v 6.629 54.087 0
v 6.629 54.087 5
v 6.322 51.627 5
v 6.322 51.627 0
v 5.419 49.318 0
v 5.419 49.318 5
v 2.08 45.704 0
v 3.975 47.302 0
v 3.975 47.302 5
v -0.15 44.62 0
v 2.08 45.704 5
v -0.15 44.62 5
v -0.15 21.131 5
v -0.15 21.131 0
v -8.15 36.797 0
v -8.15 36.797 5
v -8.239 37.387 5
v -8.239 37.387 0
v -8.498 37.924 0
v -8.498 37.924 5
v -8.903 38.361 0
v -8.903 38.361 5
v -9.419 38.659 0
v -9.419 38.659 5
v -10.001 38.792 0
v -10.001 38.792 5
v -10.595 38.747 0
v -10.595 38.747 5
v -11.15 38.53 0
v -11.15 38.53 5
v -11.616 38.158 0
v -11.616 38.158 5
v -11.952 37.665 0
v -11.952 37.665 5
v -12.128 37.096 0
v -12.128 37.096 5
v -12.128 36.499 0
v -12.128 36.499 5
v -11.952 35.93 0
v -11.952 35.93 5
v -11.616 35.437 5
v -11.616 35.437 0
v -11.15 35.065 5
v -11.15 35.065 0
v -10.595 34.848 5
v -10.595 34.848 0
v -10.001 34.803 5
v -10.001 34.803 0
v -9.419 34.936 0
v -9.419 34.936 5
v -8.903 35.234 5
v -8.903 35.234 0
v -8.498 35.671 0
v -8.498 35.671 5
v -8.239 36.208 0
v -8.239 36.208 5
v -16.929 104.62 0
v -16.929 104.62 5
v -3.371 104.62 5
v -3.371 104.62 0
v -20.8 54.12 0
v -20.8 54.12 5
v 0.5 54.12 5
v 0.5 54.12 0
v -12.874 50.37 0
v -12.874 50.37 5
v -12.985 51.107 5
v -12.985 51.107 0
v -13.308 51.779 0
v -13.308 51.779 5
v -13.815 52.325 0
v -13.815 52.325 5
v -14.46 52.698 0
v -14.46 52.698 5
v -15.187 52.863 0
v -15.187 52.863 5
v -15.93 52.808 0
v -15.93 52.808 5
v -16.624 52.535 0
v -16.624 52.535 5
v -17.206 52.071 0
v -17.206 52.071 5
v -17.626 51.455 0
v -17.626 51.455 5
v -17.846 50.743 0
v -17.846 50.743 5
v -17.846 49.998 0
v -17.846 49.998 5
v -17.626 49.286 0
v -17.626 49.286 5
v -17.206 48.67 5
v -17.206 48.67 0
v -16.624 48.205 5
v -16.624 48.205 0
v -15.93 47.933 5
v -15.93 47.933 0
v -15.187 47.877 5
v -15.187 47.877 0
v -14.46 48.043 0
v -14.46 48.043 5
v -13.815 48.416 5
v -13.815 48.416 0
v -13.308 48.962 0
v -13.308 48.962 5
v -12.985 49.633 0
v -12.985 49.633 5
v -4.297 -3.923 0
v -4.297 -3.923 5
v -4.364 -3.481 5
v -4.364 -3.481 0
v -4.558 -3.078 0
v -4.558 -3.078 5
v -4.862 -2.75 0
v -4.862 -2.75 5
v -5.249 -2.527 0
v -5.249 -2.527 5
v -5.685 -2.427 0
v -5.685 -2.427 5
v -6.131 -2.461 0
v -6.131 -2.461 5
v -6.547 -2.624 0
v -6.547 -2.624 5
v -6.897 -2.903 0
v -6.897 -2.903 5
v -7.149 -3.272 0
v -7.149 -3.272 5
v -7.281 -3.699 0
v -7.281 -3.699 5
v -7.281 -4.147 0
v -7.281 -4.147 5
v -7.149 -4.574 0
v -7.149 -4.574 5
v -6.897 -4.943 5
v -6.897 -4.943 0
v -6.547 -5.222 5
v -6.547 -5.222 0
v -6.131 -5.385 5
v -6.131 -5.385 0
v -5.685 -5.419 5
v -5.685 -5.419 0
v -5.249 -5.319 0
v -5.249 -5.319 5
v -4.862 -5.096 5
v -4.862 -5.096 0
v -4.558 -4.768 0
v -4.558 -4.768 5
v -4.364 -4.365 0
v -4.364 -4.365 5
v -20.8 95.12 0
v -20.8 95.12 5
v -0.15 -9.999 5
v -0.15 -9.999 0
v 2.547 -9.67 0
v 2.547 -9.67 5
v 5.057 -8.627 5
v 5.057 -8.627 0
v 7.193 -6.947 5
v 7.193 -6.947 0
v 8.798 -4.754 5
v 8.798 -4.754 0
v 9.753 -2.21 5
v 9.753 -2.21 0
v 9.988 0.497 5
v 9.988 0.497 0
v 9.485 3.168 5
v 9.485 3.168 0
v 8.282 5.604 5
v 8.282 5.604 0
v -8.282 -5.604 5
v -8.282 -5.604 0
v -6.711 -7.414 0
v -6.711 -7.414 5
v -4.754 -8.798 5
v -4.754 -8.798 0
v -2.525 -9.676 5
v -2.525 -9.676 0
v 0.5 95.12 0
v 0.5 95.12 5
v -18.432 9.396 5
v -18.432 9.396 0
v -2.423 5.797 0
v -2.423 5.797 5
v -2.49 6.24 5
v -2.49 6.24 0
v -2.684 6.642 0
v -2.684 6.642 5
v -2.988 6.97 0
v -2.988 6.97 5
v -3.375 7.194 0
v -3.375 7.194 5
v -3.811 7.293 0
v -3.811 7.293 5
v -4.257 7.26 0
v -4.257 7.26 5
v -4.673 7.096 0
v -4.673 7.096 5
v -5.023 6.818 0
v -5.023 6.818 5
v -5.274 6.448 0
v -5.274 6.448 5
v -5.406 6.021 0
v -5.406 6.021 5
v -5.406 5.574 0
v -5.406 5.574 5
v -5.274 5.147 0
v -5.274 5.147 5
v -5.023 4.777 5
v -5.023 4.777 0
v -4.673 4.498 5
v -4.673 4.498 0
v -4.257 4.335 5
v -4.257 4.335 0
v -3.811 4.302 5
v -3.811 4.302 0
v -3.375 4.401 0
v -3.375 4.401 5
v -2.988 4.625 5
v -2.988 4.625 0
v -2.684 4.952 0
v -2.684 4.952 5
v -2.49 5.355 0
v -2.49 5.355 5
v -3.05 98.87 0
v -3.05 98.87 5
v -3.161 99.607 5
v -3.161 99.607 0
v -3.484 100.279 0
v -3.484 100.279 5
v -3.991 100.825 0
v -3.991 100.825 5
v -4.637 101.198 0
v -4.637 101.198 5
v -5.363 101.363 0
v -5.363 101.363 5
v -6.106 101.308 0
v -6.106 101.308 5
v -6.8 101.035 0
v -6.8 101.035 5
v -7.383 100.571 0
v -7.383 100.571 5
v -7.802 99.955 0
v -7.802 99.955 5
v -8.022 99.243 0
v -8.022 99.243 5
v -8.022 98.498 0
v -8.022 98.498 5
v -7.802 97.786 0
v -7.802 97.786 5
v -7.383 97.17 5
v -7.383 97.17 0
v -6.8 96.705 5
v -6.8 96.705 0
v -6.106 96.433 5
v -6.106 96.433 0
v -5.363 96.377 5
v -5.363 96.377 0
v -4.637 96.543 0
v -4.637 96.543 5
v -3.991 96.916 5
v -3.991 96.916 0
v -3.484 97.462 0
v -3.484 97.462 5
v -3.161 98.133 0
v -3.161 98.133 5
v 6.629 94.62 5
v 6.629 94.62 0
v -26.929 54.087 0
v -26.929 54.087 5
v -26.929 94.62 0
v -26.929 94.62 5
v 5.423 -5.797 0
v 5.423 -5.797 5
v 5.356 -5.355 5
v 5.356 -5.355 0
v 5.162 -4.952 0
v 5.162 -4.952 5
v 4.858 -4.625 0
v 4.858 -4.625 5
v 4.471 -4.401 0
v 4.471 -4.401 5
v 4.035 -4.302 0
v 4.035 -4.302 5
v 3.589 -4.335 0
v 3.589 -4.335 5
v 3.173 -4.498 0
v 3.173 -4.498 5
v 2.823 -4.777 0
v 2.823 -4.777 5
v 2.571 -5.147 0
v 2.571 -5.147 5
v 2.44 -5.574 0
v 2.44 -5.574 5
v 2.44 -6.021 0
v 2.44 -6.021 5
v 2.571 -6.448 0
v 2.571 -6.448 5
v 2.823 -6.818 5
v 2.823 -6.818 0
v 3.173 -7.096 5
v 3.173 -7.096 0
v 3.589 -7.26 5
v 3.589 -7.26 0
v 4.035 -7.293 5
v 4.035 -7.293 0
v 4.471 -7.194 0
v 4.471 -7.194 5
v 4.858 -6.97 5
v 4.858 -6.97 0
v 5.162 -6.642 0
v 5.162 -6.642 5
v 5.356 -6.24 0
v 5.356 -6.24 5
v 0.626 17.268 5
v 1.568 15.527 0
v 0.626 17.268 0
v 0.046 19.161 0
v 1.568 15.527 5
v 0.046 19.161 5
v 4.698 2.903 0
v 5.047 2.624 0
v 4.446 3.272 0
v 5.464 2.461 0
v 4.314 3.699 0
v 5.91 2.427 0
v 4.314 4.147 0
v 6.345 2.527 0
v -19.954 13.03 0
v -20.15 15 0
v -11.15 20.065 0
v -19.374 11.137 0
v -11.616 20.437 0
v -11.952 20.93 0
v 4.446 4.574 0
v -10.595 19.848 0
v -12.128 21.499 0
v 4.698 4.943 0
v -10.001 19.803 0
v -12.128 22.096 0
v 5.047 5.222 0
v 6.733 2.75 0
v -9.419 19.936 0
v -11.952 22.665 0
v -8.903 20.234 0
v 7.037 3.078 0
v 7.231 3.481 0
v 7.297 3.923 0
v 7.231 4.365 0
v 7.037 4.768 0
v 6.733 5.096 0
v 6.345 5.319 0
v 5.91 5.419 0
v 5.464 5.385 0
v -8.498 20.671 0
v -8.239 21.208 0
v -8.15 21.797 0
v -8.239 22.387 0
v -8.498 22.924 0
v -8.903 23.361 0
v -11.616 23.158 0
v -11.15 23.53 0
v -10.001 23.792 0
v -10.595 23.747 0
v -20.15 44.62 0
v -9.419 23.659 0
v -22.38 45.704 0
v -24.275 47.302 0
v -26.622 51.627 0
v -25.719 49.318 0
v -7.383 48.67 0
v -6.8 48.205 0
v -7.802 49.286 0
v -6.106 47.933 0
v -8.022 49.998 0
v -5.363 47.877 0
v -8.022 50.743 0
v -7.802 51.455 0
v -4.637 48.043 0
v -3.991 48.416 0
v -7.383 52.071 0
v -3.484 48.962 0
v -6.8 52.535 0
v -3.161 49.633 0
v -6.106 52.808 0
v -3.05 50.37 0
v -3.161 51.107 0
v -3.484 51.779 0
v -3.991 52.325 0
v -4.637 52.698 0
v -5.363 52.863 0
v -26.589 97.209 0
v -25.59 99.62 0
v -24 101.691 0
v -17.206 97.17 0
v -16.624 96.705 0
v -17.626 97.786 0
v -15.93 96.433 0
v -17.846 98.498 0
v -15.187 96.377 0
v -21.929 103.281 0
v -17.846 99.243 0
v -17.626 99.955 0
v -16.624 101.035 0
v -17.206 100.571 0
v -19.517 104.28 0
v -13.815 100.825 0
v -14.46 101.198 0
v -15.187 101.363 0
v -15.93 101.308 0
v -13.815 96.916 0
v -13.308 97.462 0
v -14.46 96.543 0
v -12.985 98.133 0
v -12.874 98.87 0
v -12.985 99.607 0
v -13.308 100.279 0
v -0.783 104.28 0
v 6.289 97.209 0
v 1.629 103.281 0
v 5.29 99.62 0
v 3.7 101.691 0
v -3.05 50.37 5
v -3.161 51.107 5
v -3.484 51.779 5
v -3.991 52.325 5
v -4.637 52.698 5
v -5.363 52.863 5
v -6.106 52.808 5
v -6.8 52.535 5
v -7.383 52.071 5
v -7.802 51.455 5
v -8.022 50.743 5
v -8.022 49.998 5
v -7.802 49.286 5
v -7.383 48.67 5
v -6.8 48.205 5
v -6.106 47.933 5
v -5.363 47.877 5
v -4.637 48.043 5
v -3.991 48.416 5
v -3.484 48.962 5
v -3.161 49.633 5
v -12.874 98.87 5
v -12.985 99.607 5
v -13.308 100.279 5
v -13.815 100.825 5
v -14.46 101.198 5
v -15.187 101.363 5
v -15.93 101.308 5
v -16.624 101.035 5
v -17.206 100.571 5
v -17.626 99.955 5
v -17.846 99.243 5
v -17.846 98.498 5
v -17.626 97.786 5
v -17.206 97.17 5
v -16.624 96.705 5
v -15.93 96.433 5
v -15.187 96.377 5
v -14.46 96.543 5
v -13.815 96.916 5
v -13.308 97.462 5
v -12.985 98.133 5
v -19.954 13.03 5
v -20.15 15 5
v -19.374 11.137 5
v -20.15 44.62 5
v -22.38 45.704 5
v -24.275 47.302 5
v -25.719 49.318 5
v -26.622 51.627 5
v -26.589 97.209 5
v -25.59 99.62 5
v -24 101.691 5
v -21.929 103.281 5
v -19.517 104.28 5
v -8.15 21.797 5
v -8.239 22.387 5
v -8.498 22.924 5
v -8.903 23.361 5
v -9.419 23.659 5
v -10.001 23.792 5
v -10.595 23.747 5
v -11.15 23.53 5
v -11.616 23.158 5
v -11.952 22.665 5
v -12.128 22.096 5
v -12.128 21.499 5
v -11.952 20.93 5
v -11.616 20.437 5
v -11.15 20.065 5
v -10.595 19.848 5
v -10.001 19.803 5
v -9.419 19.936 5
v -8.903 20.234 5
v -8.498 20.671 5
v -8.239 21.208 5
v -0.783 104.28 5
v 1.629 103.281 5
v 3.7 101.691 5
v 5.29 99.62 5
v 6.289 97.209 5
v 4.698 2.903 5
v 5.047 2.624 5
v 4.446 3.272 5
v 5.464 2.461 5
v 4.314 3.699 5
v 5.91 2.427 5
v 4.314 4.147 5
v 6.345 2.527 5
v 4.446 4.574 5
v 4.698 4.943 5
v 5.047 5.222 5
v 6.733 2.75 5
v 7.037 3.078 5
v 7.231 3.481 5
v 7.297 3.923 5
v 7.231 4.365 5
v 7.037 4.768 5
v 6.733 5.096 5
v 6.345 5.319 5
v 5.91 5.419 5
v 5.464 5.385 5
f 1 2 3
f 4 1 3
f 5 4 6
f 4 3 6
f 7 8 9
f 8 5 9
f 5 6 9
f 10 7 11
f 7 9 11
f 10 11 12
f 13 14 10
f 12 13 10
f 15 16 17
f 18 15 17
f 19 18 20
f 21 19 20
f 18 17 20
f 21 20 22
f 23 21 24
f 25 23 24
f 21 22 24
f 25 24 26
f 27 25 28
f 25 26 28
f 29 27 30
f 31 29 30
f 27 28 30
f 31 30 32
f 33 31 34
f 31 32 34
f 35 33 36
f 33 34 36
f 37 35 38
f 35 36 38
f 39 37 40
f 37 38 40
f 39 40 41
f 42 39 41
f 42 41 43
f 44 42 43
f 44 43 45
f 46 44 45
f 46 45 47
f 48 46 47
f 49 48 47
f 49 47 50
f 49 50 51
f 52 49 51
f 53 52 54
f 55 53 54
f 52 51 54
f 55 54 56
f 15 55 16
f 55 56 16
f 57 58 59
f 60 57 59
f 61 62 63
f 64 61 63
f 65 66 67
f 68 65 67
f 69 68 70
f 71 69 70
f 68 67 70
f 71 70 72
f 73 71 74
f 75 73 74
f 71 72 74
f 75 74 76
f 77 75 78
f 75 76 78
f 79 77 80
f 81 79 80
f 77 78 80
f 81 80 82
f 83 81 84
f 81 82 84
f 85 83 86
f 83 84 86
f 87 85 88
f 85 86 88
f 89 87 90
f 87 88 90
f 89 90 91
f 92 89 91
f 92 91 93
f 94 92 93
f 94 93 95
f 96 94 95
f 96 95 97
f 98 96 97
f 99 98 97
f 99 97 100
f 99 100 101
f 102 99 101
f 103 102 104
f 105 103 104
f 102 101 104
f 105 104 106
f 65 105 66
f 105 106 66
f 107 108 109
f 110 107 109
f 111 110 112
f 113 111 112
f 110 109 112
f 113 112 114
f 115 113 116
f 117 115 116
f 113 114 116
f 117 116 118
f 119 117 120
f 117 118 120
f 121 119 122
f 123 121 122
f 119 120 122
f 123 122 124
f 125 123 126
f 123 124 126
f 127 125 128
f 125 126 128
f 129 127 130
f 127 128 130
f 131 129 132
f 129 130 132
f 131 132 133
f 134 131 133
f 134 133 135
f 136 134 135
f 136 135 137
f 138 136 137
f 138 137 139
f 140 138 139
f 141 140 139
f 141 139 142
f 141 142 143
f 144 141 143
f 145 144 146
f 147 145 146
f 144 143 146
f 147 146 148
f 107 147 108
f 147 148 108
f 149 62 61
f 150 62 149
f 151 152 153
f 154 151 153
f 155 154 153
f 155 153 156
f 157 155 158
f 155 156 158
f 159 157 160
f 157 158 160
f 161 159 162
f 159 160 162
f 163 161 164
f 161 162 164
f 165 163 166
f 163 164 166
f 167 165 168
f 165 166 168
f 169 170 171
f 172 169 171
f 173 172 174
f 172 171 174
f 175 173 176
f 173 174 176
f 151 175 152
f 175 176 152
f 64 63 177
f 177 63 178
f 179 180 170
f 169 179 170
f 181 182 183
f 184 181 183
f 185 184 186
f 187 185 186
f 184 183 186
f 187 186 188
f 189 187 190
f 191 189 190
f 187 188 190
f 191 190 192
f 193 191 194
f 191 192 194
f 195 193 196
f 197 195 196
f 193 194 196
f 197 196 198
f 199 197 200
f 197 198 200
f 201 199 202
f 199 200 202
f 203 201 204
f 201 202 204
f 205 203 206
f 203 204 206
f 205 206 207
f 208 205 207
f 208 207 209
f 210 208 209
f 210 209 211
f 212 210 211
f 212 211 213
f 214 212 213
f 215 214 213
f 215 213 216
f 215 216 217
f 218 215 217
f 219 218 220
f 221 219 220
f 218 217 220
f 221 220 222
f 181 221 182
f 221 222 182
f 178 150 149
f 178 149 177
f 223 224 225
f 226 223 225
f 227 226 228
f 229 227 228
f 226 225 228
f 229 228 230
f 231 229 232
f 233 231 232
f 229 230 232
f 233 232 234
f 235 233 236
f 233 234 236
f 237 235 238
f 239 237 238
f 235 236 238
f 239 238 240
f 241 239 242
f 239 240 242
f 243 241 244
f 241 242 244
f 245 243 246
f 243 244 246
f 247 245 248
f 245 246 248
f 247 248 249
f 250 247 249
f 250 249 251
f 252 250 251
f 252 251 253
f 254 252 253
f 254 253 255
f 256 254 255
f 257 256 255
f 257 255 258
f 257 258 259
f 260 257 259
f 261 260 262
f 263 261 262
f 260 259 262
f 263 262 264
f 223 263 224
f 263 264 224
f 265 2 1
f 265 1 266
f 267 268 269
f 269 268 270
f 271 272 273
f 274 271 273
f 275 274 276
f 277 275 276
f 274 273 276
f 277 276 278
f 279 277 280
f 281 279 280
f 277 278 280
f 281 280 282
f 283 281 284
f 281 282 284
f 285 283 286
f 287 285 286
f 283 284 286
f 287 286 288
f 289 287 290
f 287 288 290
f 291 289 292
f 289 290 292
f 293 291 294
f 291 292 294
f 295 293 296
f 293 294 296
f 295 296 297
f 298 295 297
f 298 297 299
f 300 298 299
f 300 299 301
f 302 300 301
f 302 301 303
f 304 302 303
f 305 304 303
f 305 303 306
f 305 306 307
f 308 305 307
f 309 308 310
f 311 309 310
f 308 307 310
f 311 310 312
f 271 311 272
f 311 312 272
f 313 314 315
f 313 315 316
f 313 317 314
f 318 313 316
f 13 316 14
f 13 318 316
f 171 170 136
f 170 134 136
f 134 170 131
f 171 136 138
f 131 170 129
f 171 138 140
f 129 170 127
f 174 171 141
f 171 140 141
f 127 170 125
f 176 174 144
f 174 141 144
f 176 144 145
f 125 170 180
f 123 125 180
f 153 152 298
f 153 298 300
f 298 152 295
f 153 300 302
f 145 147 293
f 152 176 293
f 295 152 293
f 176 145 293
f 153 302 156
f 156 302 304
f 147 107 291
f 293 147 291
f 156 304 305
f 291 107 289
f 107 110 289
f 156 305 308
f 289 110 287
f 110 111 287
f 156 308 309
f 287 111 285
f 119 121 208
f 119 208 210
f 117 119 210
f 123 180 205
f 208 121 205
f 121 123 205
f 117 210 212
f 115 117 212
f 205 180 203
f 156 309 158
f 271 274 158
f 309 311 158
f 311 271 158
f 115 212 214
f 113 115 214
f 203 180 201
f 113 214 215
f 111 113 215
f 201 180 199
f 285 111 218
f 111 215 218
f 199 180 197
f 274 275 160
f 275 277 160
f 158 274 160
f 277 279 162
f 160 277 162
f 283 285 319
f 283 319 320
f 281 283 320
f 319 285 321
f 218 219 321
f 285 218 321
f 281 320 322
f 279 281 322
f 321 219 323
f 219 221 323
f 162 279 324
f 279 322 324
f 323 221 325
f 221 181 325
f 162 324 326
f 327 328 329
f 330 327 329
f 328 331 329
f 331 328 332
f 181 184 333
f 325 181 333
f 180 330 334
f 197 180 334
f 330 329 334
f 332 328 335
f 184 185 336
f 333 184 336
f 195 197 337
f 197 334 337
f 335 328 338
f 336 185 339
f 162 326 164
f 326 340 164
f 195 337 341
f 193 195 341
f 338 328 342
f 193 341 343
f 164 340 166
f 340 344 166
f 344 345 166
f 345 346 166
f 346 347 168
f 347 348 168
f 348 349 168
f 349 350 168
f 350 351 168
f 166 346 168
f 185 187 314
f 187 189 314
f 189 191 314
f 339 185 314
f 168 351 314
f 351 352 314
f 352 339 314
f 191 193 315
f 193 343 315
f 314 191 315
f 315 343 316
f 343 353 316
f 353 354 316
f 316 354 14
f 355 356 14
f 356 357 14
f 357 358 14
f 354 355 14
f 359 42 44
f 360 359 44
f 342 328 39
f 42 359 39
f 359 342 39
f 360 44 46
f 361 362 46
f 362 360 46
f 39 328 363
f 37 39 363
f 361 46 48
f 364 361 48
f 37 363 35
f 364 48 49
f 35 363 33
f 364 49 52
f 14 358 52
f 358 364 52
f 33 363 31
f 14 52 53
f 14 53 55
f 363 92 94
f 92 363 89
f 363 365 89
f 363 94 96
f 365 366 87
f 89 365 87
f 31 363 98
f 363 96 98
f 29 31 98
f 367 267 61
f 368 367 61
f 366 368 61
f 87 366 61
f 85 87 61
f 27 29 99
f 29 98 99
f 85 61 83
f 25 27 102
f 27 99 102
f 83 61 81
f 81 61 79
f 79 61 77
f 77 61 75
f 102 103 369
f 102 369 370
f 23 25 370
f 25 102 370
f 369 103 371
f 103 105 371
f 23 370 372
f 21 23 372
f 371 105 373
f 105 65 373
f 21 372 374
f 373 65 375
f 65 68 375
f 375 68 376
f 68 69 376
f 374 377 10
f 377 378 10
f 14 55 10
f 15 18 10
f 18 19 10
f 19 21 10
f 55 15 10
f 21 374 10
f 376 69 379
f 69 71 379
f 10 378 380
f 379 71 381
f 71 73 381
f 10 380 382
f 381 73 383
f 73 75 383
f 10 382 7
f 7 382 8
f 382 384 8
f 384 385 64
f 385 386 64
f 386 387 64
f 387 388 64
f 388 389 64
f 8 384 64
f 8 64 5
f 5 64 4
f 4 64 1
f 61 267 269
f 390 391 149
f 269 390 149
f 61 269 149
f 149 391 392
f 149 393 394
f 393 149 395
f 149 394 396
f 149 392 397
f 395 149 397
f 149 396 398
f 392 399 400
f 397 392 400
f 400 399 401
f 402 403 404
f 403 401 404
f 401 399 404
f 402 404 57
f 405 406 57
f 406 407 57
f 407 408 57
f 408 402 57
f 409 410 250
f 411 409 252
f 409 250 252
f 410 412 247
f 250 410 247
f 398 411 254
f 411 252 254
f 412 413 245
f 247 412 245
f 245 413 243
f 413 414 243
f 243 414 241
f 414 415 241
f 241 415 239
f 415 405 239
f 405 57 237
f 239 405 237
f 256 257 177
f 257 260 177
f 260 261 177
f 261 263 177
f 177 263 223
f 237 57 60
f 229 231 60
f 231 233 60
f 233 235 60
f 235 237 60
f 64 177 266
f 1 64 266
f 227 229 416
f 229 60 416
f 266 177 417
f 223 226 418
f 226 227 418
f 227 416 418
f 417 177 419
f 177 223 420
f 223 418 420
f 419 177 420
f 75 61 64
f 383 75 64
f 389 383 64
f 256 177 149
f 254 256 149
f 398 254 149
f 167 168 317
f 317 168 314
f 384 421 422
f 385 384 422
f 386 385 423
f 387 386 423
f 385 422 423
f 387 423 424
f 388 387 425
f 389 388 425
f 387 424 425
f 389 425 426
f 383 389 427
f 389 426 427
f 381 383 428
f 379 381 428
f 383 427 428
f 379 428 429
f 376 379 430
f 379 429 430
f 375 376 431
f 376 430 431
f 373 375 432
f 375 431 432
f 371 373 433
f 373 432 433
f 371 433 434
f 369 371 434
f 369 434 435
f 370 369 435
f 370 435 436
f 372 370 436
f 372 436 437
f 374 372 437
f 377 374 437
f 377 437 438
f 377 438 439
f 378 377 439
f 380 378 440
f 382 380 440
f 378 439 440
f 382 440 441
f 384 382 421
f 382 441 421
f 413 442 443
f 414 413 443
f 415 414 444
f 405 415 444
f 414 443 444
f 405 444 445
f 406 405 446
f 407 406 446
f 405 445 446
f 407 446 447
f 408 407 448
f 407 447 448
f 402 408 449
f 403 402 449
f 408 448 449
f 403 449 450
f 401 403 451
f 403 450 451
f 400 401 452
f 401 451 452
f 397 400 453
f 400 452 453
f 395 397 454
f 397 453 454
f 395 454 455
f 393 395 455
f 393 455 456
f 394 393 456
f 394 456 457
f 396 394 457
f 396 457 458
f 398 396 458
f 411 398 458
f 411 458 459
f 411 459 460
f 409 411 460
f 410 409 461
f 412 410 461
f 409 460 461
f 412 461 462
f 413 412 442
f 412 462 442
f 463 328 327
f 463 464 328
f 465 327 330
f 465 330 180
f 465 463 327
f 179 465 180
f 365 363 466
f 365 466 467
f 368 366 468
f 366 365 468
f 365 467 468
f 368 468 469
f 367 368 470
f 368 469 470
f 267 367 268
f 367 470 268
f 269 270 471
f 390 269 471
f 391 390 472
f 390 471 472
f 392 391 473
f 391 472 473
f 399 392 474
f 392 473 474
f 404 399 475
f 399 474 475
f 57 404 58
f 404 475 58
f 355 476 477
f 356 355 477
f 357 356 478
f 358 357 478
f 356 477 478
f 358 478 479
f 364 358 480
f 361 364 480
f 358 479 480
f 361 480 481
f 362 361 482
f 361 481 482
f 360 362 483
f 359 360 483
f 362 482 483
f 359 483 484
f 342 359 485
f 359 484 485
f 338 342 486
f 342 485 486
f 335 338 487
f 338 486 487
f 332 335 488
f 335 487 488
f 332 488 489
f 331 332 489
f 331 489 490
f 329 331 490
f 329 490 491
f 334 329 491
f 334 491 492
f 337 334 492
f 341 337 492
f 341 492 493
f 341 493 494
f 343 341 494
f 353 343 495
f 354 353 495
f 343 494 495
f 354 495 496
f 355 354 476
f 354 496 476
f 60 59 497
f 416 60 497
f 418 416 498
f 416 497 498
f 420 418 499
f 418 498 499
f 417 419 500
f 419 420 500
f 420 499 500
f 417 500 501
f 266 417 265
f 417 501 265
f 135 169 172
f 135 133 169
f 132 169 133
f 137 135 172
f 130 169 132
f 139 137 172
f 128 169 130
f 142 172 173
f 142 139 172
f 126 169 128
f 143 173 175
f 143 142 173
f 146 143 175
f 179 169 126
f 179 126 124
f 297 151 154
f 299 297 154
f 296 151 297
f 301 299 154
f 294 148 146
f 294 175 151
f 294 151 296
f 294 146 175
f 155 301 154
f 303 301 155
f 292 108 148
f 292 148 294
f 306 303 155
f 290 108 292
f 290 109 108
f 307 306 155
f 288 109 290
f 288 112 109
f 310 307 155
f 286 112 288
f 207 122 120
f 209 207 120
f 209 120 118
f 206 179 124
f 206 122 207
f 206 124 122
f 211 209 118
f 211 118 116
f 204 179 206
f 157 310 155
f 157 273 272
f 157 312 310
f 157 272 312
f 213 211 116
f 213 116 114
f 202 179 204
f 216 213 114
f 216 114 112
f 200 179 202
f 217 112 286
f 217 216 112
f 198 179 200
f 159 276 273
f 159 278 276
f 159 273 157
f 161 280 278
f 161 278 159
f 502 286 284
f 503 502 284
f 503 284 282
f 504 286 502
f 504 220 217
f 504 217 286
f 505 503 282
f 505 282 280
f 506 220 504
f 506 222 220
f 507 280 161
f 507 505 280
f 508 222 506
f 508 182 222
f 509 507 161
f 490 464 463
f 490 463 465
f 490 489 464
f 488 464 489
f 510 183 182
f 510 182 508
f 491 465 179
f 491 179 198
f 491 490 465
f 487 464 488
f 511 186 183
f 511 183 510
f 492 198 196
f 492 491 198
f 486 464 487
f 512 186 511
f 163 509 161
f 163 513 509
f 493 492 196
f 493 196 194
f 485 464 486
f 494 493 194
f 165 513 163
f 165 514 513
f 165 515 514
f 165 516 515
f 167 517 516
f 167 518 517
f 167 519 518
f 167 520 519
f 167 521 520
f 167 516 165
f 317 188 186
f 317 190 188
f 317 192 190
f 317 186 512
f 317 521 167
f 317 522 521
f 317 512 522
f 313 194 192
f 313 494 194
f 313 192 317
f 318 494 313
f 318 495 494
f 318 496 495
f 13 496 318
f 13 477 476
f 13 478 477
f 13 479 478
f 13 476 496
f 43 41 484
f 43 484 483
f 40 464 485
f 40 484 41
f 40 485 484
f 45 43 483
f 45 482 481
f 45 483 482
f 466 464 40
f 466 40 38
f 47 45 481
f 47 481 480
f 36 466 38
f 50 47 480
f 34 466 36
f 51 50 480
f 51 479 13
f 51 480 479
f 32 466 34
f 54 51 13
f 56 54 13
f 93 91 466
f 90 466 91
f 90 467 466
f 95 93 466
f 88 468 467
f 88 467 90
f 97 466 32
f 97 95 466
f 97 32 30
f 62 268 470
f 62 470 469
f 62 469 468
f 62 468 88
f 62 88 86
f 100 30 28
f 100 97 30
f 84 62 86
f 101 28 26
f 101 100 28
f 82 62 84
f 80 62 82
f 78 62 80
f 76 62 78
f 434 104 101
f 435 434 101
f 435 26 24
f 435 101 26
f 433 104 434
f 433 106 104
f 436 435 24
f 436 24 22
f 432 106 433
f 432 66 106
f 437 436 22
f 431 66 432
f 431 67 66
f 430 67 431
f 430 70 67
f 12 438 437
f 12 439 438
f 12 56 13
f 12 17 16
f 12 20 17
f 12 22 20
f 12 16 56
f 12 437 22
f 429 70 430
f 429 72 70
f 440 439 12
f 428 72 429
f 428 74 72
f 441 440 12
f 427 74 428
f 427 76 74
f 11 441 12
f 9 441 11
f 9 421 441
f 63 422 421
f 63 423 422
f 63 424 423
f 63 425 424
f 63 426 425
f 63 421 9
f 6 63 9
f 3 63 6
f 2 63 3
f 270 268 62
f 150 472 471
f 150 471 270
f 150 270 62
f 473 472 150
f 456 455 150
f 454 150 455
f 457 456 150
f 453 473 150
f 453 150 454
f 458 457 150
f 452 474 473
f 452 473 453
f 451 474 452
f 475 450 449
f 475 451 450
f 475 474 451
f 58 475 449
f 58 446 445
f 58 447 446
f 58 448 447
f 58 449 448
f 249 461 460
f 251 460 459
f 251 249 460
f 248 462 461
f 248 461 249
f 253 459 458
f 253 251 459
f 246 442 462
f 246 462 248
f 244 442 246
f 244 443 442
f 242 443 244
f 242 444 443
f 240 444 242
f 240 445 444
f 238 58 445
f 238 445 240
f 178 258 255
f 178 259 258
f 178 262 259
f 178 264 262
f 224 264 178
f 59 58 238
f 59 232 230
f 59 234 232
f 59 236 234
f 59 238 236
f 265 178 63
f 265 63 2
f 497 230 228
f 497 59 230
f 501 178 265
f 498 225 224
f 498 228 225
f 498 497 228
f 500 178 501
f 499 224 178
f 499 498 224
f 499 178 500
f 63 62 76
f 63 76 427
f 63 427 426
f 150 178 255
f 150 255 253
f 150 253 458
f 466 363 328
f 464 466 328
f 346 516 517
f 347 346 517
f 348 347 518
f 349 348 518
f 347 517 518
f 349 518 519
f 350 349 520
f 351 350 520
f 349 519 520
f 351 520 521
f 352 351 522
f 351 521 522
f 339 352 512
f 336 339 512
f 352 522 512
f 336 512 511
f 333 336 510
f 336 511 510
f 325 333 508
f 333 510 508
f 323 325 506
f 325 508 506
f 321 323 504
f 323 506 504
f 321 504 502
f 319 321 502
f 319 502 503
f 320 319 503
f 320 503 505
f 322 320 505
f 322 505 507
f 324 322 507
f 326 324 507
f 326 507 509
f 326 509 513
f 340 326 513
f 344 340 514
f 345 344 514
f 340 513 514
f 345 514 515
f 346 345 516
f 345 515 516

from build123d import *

# Parameters (mm, degrees)
BOSS_EXTRUDE1_DEPTH = 5
SKETCH4_W           = 33.55861501
SKETCH4_H           = 60
BOSS_EXTRUDE2_DEPTH = 5
SKETCH3_R           = 2.5
SKETCH3_W           = 21.3
SKETCH3_H           = 41
CUT_EXTRUDE1_DEPTH  = 5
FILLET1_R           = 10
SKETCH2_R           = 1.5
SKETCH2_R_2         = 2
CUT_EXTRUDE2_DEPTH  = 5
FILLET2_R           = 10


with BuildPart() as part:
    # Sketch1 → Boss-Extrude1 (new body)
    with BuildSketch(Plane.XY):
        with BuildLine():
            Line((-20.15, 104.620325978), (-20.15, 11.934589711))
            Line((-20.15, 11.934589711), (-8.282080395, -5.604207734))
            ThreePointArc((-8.282080395, -5.604207734), (-4.754289632, -8.797541139), (-0.15, -9.998874937))
            ThreePointArc((-0.15, -9.998874937), (8.797541139, -4.754289632), (8.282080395, 5.604207734))
            Line((8.282080395, 5.604207734), (-0.15, 18.065410289))
            Line((-0.15, 18.065410289), (-0.15, 104.620325978))
            Line((-0.15, 104.620325978), (-20.15, 104.620325978))
        make_face()
    extrude(amount=BOSS_EXTRUDE1_DEPTH)

    # Sketch4 → Boss-Extrude2 (add)
    with BuildSketch(Plane.XY.offset(5)):
        with Locations((-10.15, 74.620325978)):
            Rectangle(SKETCH4_W, SKETCH4_H)
    extrude(amount=-BOSS_EXTRUDE2_DEPTH)

    # Sketch3 → Cut-Extrude1 (cut)
    with BuildSketch(Plane.XY.offset(5)):
        with Locations((-5.55, 50.370325978)):
            Circle(SKETCH3_R)
        with Locations((-15.37372371, 50.370325978)):
            Circle(SKETCH3_R)
        with Locations((-15.37372371, 98.870325978)):
            Circle(SKETCH3_R)
        with Locations((-5.55, 98.870325978)):
            Circle(SKETCH3_R)
        with Locations((-10.15, 74.620325978)):
            Rectangle(SKETCH3_W, SKETCH3_H)
    extrude(amount=-CUT_EXTRUDE1_DEPTH, mode=Mode.SUBTRACT)

    # Fillet1
    # the kernel refuses this fillet: 10 mm, written as the material it takes off along each edge
    with BuildSketch(Plane(origin=(-26.929307505, 104.620325978, 30), x_dir=(1, 0, 0), z_dir=(0, 0, -1))) as fillet1_piece_1:
        with BuildLine():
            CenterArc((FILLET1_R, FILLET1_R), FILLET1_R, 180, 90)
            Line((0, FILLET1_R), (-FILLET1_R * 0.02, FILLET1_R))
            Line((-FILLET1_R * 0.02, FILLET1_R), (-FILLET1_R * 0.02, -FILLET1_R * 0.02))
            Line((-FILLET1_R * 0.02, -FILLET1_R * 0.02), (FILLET1_R, -FILLET1_R * 0.02))
            Line((FILLET1_R, -FILLET1_R * 0.02), (FILLET1_R, 0))
        make_face()
    extrude(amount=55, mode=Mode.SUBTRACT)
    with BuildSketch(Plane(origin=(6.629307505, 104.620325978, 30), x_dir=(-1, 0, 0), z_dir=(0, 0, -1))) as fillet1_piece_2:
        with BuildLine():
            CenterArc((FILLET1_R, -FILLET1_R), FILLET1_R, 90, 90)
            Line((0, -FILLET1_R), (-FILLET1_R * 0.02, -FILLET1_R))
            Line((-FILLET1_R * 0.02, -FILLET1_R), (-FILLET1_R * 0.02, FILLET1_R * 0.02))
            Line((-FILLET1_R * 0.02, FILLET1_R * 0.02), (FILLET1_R, FILLET1_R * 0.02))
            Line((FILLET1_R, FILLET1_R * 0.02), (FILLET1_R, 0))
        make_face()
    extrude(amount=55, mode=Mode.SUBTRACT)
    with BuildSketch(Plane(origin=(6.629307505, 44.620325978, 28.667902824), x_dir=(0, 1, 0), z_dir=(0, 0, -1))) as fillet1_piece_3:
        with BuildLine():
            CenterArc((9.46716113, -10), FILLET1_R, 90, 71.211889426)
            Line((0, -6.779307505), (-0.189343223, -6.714893655))
            ThreePointArc((-0.189343223, -6.714893655), (-0.2, -3.389653753), (-0.2, 0))
            Line((-0.2, 0), (0, 0.2))
            Line((0, 0.2), (9.46716113, 0.2))
            Line((9.46716113, 0.2), (9.46716113, 0))
        make_face()
    extrude(amount=52.335805648, mode=Mode.SUBTRACT)
    with BuildSketch(Plane(origin=(-26.929307505, 44.620325978, 28.667902824), x_dir=(0, 1, 0), z_dir=(0, 0, -1))) as fillet1_piece_4:
        with BuildLine():
            CenterArc((9.46716113, 10), FILLET1_R, 198.788110574, 71.211889426)
            Line((0, 6.779307505), (-0.189343223, 6.714893655))
            ThreePointArc((-0.189343223, 6.714893655), (-0.2, 3.389653753), (-0.2, 0))
            Line((-0.2, 0), (0, -0.2))
            Line((0, -0.2), (9.46716113, -0.2))
            Line((9.46716113, -0.2), (9.46716113, 0))
        make_face()
    extrude(amount=52.335805648, mode=Mode.SUBTRACT)

    # Sketch2 → Cut-Extrude2 (cut)
    with BuildSketch(Plane.XY.offset(5)):
        with Locations((-3.922945414, 5.797456277)):
            Circle(SKETCH2_R)
        with Locations((5.797456277, 3.922945414)):
            Circle(SKETCH2_R)
        with Locations((3.922945414, -5.797456277)):
            Circle(SKETCH2_R)
        with Locations((-5.797456277, -3.922945414)):
            Circle(SKETCH2_R)
        with Locations((-10.15, 21.797456277)):
            Circle(SKETCH2_R_2)
        with Locations((-10.15, 36.797456277)):
            Circle(SKETCH2_R_2)
    extrude(amount=-CUT_EXTRUDE2_DEPTH, mode=Mode.SUBTRACT)

    # Fillet2
    fillet2_edges = [part.edges().sort_by_distance(p)[0] for p in [
        (-20.15, 11.934589711, 2.5),
        (-0.15, 18.065410289, 2.5),
    ]]
    fillet(fillet2_edges, radius=FILLET2_R)


solid = part.part
